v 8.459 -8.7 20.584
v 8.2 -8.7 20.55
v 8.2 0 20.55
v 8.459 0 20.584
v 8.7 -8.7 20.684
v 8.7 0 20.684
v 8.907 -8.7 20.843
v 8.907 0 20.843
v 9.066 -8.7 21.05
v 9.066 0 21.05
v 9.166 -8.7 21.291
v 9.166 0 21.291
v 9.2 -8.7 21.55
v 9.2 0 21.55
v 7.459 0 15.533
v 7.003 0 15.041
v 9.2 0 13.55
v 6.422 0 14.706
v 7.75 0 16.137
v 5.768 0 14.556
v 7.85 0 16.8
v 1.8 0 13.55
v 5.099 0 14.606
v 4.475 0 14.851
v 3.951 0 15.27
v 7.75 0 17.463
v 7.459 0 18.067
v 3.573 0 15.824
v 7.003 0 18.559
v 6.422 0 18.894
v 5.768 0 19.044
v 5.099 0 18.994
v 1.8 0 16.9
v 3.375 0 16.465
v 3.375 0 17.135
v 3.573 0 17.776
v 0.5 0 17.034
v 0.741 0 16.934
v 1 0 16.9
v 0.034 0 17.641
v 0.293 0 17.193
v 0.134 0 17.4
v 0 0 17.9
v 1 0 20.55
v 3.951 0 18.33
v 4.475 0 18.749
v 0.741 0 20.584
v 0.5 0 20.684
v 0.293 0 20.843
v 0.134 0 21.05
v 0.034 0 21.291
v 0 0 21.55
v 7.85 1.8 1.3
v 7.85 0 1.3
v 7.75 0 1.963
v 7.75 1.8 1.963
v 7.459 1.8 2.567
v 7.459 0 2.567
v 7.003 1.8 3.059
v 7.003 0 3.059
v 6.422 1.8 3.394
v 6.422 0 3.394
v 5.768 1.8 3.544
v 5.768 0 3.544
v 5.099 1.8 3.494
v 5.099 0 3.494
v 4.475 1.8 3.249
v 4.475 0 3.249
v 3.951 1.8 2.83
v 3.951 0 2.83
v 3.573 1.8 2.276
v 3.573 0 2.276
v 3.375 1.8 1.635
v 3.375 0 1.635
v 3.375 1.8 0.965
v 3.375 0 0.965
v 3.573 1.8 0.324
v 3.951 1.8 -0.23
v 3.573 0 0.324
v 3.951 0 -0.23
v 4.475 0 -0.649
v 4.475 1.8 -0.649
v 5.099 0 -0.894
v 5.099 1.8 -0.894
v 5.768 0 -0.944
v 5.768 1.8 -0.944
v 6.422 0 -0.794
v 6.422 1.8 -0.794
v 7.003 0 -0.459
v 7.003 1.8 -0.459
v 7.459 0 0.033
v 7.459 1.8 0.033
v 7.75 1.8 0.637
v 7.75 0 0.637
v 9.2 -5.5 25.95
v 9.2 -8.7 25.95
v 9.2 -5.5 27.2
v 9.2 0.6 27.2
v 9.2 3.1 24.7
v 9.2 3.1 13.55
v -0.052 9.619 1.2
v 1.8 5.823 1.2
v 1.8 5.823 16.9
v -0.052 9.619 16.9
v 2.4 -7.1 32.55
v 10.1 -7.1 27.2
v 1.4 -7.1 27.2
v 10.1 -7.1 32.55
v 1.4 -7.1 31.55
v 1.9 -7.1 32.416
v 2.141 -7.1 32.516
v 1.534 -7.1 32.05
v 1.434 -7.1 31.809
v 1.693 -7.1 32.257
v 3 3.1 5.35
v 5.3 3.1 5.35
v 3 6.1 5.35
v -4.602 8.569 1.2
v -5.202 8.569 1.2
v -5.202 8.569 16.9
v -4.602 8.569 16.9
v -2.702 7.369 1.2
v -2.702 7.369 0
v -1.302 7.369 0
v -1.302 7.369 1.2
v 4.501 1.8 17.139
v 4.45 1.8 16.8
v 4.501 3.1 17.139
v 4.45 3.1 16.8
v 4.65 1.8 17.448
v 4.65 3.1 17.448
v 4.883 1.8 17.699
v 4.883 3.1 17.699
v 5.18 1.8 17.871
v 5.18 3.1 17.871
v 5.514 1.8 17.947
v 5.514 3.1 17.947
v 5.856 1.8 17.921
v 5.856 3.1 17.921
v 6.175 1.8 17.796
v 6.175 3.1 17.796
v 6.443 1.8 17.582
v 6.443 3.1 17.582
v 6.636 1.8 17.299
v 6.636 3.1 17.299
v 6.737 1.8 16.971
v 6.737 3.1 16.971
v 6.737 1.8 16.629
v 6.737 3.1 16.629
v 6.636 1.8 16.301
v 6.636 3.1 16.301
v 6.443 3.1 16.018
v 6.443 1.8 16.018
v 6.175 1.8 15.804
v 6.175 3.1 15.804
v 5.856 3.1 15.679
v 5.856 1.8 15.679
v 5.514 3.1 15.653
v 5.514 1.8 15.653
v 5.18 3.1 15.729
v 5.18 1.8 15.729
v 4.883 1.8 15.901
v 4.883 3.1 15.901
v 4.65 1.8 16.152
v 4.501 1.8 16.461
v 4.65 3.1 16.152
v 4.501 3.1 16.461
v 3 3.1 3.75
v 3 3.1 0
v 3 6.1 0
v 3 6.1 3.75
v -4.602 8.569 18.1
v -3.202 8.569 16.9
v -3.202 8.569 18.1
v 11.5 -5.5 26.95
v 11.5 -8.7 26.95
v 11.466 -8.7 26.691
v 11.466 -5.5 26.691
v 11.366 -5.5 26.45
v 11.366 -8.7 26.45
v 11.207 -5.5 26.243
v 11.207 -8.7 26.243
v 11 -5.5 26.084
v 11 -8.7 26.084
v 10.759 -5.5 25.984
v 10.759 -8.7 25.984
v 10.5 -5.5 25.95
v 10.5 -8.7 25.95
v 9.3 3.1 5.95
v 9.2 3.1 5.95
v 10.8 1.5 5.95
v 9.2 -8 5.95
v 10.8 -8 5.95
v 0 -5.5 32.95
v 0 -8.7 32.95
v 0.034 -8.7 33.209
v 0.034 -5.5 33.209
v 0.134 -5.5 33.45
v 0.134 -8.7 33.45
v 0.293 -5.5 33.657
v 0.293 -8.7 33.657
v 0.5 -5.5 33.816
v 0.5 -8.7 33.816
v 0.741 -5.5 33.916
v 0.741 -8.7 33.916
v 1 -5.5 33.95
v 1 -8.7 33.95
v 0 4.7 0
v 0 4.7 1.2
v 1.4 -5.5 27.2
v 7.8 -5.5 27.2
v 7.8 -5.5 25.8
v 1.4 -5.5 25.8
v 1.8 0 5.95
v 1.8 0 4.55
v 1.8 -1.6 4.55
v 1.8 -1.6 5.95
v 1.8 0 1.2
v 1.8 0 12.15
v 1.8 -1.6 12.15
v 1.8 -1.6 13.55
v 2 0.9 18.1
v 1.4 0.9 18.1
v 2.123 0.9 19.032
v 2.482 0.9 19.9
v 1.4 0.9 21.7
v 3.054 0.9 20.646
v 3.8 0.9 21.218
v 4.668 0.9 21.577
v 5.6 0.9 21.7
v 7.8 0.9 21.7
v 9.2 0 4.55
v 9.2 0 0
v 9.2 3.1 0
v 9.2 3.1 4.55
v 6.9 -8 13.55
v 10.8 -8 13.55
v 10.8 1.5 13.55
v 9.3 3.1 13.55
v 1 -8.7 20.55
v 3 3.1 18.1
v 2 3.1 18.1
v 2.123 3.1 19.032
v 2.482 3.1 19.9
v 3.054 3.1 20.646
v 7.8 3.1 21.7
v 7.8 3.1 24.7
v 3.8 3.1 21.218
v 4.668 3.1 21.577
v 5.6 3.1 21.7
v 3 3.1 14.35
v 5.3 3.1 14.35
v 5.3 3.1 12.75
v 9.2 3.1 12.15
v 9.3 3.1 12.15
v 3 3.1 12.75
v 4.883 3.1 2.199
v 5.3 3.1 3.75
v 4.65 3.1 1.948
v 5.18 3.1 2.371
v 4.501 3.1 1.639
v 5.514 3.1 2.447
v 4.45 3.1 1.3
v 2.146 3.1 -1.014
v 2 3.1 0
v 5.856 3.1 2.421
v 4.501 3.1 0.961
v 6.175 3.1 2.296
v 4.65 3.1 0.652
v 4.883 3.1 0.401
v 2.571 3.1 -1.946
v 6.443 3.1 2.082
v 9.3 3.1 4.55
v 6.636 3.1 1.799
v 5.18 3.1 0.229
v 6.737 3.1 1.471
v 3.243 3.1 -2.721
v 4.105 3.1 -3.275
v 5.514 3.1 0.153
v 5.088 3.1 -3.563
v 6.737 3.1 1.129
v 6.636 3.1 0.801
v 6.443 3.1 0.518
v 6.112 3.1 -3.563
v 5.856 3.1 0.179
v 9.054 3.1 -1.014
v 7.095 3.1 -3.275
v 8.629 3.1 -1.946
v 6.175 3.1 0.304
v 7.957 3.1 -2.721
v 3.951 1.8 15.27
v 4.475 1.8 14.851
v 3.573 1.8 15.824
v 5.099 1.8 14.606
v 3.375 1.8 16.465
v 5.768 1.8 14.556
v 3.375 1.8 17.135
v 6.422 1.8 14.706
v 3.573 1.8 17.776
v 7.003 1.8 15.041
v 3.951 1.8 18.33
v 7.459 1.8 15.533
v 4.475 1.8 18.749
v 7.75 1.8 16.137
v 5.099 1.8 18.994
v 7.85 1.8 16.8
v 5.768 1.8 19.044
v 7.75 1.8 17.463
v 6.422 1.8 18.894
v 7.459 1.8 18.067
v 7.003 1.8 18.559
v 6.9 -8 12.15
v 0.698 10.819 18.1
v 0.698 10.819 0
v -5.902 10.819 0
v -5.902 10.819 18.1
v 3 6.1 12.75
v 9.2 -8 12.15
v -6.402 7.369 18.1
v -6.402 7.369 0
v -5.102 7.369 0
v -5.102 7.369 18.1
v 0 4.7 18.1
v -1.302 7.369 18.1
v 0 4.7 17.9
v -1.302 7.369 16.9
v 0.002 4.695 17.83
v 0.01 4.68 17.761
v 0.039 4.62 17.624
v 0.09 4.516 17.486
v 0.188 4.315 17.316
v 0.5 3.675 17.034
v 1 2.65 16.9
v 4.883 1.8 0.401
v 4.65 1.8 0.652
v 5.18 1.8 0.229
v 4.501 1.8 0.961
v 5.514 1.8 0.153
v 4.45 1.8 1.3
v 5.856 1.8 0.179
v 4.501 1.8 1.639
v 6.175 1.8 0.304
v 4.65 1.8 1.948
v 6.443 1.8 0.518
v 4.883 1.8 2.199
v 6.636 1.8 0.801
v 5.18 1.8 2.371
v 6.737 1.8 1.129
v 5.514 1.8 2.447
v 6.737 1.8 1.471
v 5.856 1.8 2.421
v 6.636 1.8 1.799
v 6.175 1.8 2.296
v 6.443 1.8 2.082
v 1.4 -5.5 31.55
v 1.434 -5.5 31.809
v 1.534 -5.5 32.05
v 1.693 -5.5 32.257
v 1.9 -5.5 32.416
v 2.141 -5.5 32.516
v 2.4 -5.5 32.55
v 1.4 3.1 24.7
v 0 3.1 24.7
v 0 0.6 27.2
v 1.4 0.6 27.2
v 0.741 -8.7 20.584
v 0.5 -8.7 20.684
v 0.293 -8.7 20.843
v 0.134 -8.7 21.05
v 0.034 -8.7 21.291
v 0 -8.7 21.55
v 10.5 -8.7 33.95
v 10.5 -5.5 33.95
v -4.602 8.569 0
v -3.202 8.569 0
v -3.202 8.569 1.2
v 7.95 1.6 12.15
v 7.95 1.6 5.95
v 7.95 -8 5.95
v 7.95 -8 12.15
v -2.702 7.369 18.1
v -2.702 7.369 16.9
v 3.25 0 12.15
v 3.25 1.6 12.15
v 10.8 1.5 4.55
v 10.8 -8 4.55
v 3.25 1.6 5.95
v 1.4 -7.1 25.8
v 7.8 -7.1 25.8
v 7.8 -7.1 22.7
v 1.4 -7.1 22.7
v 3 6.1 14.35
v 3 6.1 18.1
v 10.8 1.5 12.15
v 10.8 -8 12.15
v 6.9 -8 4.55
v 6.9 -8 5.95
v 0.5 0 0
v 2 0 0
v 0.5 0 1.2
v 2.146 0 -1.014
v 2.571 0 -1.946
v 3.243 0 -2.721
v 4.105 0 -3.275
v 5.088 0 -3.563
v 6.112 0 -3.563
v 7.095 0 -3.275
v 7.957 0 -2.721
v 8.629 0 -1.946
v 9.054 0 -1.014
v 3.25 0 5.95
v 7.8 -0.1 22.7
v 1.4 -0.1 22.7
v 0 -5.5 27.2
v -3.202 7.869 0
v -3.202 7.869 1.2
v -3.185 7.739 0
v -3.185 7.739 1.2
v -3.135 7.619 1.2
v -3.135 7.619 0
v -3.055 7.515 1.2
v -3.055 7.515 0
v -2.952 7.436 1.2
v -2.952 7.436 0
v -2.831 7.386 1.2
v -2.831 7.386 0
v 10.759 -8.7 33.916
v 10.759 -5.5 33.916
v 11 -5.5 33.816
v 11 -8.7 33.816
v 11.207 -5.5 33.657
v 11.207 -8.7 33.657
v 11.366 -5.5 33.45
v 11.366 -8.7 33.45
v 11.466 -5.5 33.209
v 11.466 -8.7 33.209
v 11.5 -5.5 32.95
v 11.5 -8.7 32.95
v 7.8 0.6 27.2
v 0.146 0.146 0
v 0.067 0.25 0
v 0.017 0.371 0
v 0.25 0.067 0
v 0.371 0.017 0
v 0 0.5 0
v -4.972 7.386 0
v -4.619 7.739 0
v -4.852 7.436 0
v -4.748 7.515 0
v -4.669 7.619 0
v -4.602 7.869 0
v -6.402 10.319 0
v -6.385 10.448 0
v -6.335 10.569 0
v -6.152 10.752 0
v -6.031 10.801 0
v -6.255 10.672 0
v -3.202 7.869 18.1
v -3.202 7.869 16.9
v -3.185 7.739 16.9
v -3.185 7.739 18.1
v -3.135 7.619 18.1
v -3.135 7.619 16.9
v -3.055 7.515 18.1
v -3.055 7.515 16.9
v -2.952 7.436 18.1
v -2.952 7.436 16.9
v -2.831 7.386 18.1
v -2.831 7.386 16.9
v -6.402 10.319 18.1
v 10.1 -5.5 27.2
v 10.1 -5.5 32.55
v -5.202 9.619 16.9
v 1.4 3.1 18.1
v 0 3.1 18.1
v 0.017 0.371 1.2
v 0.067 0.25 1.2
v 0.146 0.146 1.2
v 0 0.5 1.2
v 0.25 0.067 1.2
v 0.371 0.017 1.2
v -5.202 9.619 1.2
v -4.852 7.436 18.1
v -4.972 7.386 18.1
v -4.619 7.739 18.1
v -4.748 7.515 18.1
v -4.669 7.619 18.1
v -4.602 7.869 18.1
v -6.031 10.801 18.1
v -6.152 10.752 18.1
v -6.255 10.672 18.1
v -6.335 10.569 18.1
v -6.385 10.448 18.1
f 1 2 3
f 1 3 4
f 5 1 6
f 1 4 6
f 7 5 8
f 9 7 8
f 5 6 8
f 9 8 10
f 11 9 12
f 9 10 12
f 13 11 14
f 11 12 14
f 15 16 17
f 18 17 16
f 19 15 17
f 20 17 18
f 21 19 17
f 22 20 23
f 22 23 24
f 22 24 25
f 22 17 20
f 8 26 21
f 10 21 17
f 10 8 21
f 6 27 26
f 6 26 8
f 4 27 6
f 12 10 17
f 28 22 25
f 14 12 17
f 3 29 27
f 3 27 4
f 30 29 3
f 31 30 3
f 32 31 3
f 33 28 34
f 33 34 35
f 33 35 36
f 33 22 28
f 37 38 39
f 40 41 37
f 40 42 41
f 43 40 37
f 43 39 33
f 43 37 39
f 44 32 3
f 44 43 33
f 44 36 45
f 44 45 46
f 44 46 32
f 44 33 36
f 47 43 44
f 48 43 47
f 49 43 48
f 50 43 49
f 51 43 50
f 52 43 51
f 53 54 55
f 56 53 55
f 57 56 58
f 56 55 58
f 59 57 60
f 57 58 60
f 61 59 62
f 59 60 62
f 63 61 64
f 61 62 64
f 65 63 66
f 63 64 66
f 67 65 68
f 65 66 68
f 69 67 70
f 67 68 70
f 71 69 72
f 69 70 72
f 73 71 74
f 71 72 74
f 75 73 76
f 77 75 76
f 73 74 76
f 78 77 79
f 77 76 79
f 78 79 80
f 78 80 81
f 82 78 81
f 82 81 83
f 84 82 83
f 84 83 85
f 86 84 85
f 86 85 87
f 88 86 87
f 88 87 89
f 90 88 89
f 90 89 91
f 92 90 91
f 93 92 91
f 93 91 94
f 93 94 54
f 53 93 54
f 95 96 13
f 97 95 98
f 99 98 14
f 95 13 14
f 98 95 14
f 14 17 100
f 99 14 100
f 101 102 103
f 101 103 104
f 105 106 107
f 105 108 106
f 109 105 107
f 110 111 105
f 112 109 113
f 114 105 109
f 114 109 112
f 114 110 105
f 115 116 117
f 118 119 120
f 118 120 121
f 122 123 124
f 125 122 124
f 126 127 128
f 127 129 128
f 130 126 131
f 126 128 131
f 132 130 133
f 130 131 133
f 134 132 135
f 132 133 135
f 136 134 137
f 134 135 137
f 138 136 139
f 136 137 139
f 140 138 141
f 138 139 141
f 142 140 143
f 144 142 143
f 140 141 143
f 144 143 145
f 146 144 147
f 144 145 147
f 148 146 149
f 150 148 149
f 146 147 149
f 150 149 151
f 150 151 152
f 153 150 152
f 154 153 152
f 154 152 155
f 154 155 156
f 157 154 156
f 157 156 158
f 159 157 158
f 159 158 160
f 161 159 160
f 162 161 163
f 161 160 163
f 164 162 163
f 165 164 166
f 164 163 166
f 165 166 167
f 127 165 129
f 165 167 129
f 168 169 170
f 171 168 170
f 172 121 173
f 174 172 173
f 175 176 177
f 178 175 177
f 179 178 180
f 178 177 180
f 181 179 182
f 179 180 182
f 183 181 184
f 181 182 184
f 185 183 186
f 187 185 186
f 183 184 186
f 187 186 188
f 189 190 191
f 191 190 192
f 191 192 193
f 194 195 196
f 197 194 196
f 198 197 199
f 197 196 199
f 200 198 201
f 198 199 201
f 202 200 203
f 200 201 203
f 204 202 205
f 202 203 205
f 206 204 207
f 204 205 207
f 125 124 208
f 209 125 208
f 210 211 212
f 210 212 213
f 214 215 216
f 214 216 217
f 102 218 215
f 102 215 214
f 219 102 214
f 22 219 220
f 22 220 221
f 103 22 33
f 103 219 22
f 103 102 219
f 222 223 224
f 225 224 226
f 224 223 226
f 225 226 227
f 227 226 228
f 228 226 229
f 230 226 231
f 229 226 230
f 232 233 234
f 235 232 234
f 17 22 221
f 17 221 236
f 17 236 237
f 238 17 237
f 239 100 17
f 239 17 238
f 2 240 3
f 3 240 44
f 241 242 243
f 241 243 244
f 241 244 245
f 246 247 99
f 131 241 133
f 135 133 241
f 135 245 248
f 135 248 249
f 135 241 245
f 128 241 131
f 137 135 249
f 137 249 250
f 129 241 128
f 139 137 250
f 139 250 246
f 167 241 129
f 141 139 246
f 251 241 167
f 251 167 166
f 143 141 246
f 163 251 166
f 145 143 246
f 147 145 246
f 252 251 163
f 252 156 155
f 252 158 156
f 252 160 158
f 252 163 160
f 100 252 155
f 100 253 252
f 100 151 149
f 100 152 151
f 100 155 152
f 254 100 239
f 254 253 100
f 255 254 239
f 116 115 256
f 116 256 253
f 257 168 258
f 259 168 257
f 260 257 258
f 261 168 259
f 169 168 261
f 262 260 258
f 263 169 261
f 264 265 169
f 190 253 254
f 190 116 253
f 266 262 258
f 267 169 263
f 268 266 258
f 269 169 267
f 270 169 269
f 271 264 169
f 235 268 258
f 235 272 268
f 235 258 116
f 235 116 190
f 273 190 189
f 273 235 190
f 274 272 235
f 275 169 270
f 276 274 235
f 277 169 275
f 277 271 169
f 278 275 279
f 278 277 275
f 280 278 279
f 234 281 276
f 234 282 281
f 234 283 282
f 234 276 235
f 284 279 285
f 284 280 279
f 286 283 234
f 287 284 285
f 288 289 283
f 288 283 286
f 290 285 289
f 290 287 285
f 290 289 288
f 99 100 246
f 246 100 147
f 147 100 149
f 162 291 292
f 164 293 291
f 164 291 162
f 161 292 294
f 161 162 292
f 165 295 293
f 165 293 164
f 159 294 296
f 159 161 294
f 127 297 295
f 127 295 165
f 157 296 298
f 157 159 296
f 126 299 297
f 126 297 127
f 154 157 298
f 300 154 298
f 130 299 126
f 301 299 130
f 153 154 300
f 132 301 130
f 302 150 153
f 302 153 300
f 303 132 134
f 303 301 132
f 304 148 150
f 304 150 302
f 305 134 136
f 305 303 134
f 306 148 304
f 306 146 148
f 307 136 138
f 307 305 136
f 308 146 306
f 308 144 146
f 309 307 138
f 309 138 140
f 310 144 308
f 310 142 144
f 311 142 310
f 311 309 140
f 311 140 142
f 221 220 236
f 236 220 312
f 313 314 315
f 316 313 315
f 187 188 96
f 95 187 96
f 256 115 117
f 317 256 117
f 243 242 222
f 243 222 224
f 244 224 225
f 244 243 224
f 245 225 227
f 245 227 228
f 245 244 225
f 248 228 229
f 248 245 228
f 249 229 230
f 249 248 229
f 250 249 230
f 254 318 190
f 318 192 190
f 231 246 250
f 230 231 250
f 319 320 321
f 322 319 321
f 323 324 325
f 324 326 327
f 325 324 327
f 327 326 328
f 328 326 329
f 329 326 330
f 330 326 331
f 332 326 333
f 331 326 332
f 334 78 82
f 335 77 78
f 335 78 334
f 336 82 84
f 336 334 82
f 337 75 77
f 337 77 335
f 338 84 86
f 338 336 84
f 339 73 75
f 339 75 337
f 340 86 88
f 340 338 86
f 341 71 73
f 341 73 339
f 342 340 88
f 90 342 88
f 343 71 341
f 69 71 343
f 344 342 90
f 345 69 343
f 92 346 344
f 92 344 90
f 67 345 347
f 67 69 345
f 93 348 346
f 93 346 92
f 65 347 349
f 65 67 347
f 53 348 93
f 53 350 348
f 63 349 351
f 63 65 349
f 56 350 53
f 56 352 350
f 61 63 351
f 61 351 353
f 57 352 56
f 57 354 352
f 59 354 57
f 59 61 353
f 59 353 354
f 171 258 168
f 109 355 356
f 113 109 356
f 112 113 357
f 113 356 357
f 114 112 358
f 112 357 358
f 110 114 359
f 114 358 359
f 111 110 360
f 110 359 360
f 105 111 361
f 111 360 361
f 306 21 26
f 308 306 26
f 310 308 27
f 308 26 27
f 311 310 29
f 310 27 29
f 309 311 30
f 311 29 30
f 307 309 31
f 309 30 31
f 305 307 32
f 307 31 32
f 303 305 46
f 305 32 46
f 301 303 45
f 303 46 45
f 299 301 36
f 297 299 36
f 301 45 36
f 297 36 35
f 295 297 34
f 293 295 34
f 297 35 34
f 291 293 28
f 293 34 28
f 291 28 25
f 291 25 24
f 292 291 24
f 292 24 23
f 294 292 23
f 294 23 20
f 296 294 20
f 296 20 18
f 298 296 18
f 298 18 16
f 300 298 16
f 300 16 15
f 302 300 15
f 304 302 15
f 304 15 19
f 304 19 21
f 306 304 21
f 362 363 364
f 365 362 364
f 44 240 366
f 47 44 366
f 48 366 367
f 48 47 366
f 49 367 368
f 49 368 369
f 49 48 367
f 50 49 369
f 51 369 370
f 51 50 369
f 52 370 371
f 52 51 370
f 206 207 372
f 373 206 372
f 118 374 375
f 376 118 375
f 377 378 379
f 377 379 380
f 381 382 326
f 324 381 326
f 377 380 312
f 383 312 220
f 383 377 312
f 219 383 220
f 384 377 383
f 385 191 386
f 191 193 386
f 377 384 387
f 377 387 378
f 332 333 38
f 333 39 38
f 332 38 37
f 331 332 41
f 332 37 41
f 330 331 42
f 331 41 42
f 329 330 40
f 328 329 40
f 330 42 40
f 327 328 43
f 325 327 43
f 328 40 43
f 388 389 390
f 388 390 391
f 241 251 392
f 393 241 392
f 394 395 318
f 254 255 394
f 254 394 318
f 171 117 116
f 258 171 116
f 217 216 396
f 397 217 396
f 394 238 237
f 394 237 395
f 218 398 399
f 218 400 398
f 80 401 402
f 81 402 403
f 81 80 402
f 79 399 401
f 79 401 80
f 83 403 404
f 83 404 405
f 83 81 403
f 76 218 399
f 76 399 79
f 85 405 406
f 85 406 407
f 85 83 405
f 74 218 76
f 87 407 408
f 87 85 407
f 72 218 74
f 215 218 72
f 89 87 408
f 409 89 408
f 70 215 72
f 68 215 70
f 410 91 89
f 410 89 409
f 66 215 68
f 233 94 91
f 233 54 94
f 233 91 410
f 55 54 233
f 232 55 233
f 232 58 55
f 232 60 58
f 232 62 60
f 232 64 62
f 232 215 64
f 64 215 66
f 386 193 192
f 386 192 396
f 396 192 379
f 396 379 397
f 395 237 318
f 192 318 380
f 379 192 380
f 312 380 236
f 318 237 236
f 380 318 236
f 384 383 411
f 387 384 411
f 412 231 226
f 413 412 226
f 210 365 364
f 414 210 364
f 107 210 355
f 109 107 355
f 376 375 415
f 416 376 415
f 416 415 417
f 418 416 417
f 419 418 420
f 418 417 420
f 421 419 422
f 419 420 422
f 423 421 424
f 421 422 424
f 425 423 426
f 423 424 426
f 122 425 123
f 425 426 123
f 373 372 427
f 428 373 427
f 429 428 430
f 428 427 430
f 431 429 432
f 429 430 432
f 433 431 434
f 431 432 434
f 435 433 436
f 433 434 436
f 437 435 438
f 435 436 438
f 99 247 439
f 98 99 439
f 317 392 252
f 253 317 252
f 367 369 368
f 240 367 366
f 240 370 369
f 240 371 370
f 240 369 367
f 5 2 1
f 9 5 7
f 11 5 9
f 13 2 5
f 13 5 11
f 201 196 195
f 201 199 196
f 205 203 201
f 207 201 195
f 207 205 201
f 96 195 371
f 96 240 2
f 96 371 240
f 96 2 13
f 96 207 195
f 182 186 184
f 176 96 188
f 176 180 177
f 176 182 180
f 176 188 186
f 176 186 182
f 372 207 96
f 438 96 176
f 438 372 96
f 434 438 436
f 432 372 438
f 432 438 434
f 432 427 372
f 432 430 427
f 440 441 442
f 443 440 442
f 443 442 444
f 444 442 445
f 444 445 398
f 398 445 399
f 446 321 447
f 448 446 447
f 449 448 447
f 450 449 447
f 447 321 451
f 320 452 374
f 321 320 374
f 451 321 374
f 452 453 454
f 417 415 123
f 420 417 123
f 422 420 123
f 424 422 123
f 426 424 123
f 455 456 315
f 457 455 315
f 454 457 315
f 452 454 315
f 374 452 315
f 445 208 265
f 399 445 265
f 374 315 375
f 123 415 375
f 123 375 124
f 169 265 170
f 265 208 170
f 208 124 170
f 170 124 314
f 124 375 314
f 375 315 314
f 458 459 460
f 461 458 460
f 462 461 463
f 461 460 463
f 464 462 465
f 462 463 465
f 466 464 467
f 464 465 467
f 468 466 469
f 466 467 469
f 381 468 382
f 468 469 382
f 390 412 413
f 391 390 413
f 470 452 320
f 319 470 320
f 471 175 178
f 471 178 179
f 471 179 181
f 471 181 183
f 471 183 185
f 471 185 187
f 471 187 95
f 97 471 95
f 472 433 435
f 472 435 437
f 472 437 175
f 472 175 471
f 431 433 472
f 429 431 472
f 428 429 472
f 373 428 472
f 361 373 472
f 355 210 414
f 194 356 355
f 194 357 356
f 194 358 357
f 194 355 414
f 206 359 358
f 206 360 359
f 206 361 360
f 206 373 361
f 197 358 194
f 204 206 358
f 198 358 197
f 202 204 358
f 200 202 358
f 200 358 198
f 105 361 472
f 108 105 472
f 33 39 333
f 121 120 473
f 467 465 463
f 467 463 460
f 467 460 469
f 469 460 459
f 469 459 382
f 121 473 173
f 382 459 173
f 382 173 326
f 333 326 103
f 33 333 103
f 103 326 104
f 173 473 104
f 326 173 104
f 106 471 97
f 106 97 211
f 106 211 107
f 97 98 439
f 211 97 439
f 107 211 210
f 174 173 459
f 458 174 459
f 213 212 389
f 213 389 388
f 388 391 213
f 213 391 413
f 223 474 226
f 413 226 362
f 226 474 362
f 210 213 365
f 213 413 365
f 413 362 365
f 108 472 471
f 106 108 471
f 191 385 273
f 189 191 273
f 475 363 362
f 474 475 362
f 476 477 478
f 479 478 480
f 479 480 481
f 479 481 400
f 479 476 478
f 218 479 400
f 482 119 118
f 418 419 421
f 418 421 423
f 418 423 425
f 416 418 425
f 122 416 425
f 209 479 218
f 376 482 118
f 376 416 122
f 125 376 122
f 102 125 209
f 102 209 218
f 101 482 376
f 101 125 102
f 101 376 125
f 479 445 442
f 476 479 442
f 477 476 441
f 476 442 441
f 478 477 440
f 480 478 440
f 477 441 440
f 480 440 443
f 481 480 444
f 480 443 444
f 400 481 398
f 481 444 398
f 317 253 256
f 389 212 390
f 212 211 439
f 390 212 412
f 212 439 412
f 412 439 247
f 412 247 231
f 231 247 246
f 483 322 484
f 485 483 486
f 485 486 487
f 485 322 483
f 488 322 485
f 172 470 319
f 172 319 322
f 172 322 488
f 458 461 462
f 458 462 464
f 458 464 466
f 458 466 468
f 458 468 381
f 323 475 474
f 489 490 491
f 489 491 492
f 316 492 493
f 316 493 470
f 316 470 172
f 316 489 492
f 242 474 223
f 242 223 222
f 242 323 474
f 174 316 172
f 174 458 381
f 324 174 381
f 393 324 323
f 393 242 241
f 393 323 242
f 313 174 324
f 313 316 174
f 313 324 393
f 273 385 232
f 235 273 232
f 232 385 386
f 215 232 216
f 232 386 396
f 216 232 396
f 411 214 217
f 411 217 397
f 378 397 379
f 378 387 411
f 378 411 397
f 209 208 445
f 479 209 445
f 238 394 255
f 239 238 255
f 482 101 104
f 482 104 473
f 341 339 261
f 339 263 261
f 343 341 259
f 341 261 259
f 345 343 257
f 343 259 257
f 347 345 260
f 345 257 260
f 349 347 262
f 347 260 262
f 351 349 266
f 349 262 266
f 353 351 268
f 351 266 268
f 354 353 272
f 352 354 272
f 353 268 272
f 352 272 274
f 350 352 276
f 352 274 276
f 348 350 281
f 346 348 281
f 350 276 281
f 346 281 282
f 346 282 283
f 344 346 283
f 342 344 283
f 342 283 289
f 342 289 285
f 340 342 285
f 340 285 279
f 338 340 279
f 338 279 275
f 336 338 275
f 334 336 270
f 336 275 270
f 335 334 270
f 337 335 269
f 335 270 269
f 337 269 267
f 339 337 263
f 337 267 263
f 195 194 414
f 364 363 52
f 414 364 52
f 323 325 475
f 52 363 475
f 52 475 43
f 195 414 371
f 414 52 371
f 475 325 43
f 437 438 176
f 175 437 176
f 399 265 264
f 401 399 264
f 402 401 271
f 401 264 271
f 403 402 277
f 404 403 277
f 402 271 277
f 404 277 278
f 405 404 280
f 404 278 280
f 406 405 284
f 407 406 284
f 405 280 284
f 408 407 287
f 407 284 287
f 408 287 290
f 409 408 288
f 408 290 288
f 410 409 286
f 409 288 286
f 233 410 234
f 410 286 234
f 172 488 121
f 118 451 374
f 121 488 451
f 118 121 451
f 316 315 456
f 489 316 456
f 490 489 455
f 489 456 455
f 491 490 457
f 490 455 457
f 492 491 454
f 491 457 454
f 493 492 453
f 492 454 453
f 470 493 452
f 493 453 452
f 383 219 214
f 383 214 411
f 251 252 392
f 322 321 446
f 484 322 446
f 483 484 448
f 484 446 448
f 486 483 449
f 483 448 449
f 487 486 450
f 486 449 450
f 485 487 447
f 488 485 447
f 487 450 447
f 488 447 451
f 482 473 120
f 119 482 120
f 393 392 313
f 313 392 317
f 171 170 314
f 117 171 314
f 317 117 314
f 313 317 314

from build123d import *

# Parameters (mm, degrees)
EXTRUSION1_DEPTH                                  = 18.1
COQUE1_START                                      = 1.2
COQUE1_DEPTH                                      = 15.7
EXTRUSION2_DEPTH                                  = 3.1
ESQUISSE3_W                                       = 6.2
ESQUISSE3_H                                       = 18.1
EXTRUSION3_DEPTH                                  = 1.9
CHAMBRAGE_POUR_VIS_T_TE_HEXAGONALE_M2_D           = 2.3
CHAMBRAGE_POUR_VIS_T_TE_HEXAGONALE_M2_CBORE_D     = 4.5
CHAMBRAGE_POUR_VIS_T_TE_HEXAGONALE_M2_CBORE_DEPTH = 1.8
ENL_V_MAT_EXTRU_1_DEPTH                           = 1.6
EXTRUSION4_DEPTH                                  = 1.6
R_P_TITION_LIN_AIRE1_COUNT                        = 2
R_P_TITION_LIN_AIRE1_PITCH                        = 9
EXTRUSION5_DEPTH                                  = 8
EXTRUSION5_DIRECTION_2_REACH                      = 27.934
ENL_V_MAT_EXTRU_2_DEPTH                           = 23.973967556
EXTRUSION6_DEPTH                                  = 11.8
EXTRUSION7_DEPTH                                  = 9.6
CHANFREIN1_SIZE                                   = 1
ESQUISSE12_W                                      = 3.65
ESQUISSE12_H                                      = 8.7
ENL_V_MAT_EXTRU_3_DEPTH                           = 32.201293006
EXTRUSION8_DEPTH                                  = 3.2
ESQUISSE14_W                                      = 6.4
ESQUISSE14_H                                      = 3.1
ENL_V_MAT_EXTRU_4_DEPTH                           = 1.6
CONG_1_R                                          = 1
CONG_2_R                                          = 1


# Read off the part's stored shape, not the designer's step: Coque1
with BuildPart() as part:
    # Esquisse1 → Extrusion1 (new body)
    with BuildSketch(Plane.XY):
        with BuildLine():
            Line((0.5, 0), (9.2, 0))
            Line((9.2, 0), (9.2, 3.1))
            Line((9.2, 3.1), (3, 3.1))
            Line((3, 3.1), (3, 6.1))
            Line((3, 6.1), (0.698275932, 10.81853434))
            Line((0.698275932, 10.81853434), (-5.901724068, 10.81853434))
            ThreePointArc((-5.901724068, 10.81853434), (-6.255277459, 10.67208773), (-6.401724068, 10.31853434))
            Line((-6.401724068, 10.31853434), (-6.401724068, 7.36853434))
            Line((-6.401724068, 7.36853434), (-5.101724068, 7.36853434))
            ThreePointArc((-5.101724068, 7.36853434), (-4.748170678, 7.514980949), (-4.601724068, 7.86853434))
            Line((-4.601724068, 7.86853434), (-4.601724068, 8.56853434))
            Line((-4.601724068, 8.56853434), (-3.201724068, 8.56853434))
            Line((-3.201724068, 8.56853434), (-3.201724068, 7.86853434))
            ThreePointArc((-3.201724068, 7.86853434), (-3.055277459, 7.514980949), (-2.701724068, 7.36853434))
            Line((-2.701724068, 7.36853434), (-1.301724068, 7.36853434))
            Line((-1.301724068, 7.36853434), (0, 4.7))
            Line((0, 4.7), (0, 0.5))
            ThreePointArc((0, 0.5), (0.146446609, 0.146446609), (0.5, 0))
        make_face()
    extrude(amount=EXTRUSION1_DEPTH)

    # Coque1 outline → Coque1 (cut)
    with BuildSketch(Plane.XY.offset(COQUE1_START)):
        with BuildLine():
            Line((-5.201724068, 8.56853434), (-3.201724068, 8.56853434))
            Line((-3.201724068, 8.56853434), (-3.201724068, 7.86853434))
            ThreePointArc((-3.201724068, 7.86853434), (-3.055277459, 7.514980949), (-2.701724068, 7.36853434))
            Line((-2.701724068, 7.36853434), (-1.301724068, 7.36853434))
            Line((-1.301724068, 7.36853434), (0, 4.7))
            Line((0, 4.7), (0, 0.5))
            ThreePointArc((0, 0.5), (0.146446609, 0.146446609), (0.5, 0))
            Line((0.5, 0), (8, 0))
            Line((8, 0), (8, 1.9))
            Line((8, 1.9), (1.8, 1.9))
            Line((1.8, 1.9), (1.8, 5.822921265))
            Line((1.8, 5.822921265), (-0.051518573, 9.61853434))
            Line((-0.051518573, 9.61853434), (-5.201724068, 9.61853434))
            Line((-5.201724068, 9.61853434), (-5.201724068, 8.56853434))
        make_face()
    extrude(amount=COQUE1_DEPTH, mode=Mode.SUBTRACT)

    # Esquisse2 → Extrusion2 (add)
    with BuildSketch(Plane(origin=(0, 3.1, 0), x_dir=(-1, 0, 0), z_dir=(0, 1, 0))):
        with BuildLine():
            Line((-9.2, 0), (-2, 0))
            ThreePointArc((-2, 0), (-5.6, -3.6), (-9.2, 0))
        make_face()
        with BuildLine():
            Line((-9.2, 18.1), (-2, 18.1))
            ThreePointArc((-2, 18.1), (-5.6, 21.7), (-9.2, 18.1))
        make_face()
    extrude(amount=-EXTRUSION2_DEPTH)

    # Esquisse3 → Extrusion3 (add)
    with BuildSketch(Plane.XZ):
        with Locations((4.9, 9.05)):
            Rectangle(ESQUISSE3_W, ESQUISSE3_H)
    extrude(amount=-EXTRUSION3_DEPTH)

    # Chambrage pour vis à tête hexagonale M2.51 (through all)
    with Locations(Plane.XZ):
        with Locations((5.6, 1.3), (5.6, 16.8)):
            CounterBoreHole(CHAMBRAGE_POUR_VIS_T_TE_HEXAGONALE_M2_D / 2, CHAMBRAGE_POUR_VIS_T_TE_HEXAGONALE_M2_CBORE_D / 2, CHAMBRAGE_POUR_VIS_T_TE_HEXAGONALE_M2_CBORE_DEPTH)

    # Esquisse6 → Enlèv. mat.-Extru.1 (cut)
    with BuildSketch(Plane.XZ):
        with BuildLine():
            Line((3.75, 4.9), (7.45, 4.9))
            ThreePointArc((7.45, 4.9), (7.803553391, 5.046446609), (7.95, 5.4))
            Line((7.95, 5.4), (7.95, 12.7))
            ThreePointArc((7.95, 12.7), (7.803553391, 13.053553391), (7.45, 13.2))
            Line((7.45, 13.2), (3.75, 13.2))
            ThreePointArc((3.75, 13.2), (3.396446609, 13.053553391), (3.25, 12.7))
            Line((3.25, 12.7), (3.25, 5.4))
            ThreePointArc((3.25, 5.4), (3.396446609, 5.046446609), (3.75, 4.9))
        make_face()
    extrude(amount=-ENL_V_MAT_EXTRU_1_DEPTH, mode=Mode.SUBTRACT)

    # Esquisse7 → Extrusion4 (add)
    with BuildSketch(Plane.XY.offset(14.35)):
        Polygon((3, 6.1), (5.3, 3.1), (3, 3.1), align=None)
    extrusion4 = extrude(amount=-EXTRUSION4_DEPTH)

    # Répétition linéaire1: Extrusion4 ×2
    with Locations(*[(0, 0, -i * R_P_TITION_LIN_AIRE1_PITCH) for i in range(1, R_P_TITION_LIN_AIRE1_COUNT)]):
        add(extrusion4)

    # Esquisse8 → Extrusion5 (add)
    with BuildSketch(Plane.XZ):
        Polygon((10.8, 4.55), (1.8, 4.55), (1.8, 5.95), (7.95, 5.95), (7.95, 12.15), (1.8, 12.15), (1.8, 13.55), (10.8, 13.55), (10.8, 12.15), (9.2, 12.15), (9.2, 5.95), (10.8, 5.95), align=None)
    extrude(amount=EXTRUSION5_DEPTH)

    # Extrusion5 direction 2: up to this face of the body (flat: up to its plane)
    extrusion5_direction_2_end = Plane(part.part.faces().sort_by_distance((6.086516905, 3.1, 9.05))[0])
    # Esquisse8 → Extrusion5 direction 2 (add, up to the picked face)
    with BuildSketch(Plane.XZ, mode=Mode.PRIVATE) as extrusion5_direction_2_sk1:
        Polygon((10.8, 4.55), (1.8, 4.55), (1.8, 5.95), (7.95, 5.95), (7.95, 12.15), (1.8, 12.15), (1.8, 13.55), (10.8, 13.55), (10.8, 12.15), (9.2, 12.15), (9.2, 5.95), (10.8, 5.95), align=None)
    extrusion5_direction_2_tool1 = split(extrude(extrusion5_direction_2_sk1.sketch, amount=-EXTRUSION5_DIRECTION_2_REACH, mode=Mode.PRIVATE), bisect_by=extrusion5_direction_2_end, keep=Keep.BOTH, mode=Mode.PRIVATE)
    add(extrusion5_direction_2_tool1.solids().sort_by(Axis((6.3, 0, 4.677279), (0, 1, 0)))[0])

    # Esquisse9 → Enlèv. mat.-Extru.2 (cut, through all)
    with BuildSketch(Plane(origin=(0, 0, 4.55), x_dir=(-1, 0, 0), z_dir=(0, 0, -1))):
        Polygon((-6.9, -8), (-1.8, -8), (-1.8, -1.6), align=None)
        Polygon((-10.8, 3.1), (-10.8, 1.5), (-9.3, 3.1), align=None)
    extrude(amount=-ENL_V_MAT_EXTRU_2_DEPTH, mode=Mode.SUBTRACT)

    # Esquisse10 → Extrusion6 (add)
    with BuildSketch(Plane(origin=(0, 3.1, 0), x_dir=(-1, 0, 0), z_dir=(0, 1, 0))):
        with BuildLine():
            Line((-9.2, 17.467725461), (-9.2, 27.2))
            Line((-9.2, 27.2), (-7.8, 27.2))
            Line((-7.8, 27.2), (-7.8, 21.7))
            Line((-7.8, 21.7), (-5.6, 21.7))
            ThreePointArc((-5.6, 21.7), (-3.054415588, 20.645584412), (-2, 18.1))
            Line((-2, 18.1), (-1.4, 18.1))
            Line((-1.4, 18.1), (-1.4, 27.2))
            Line((-1.4, 27.2), (0, 27.2))
            Line((0, 27.2), (0, 16.9))
            Line((0, 16.9), (-1.097371231, 16.9))
            Line((-1.097371231, 16.9), (-5.6, 19.545108536))
            Line((-5.6, 19.545108536), (-9.2, 17.467725461))
        make_face()
    extrude(amount=-EXTRUSION6_DEPTH)

    # Esquisse11 → Extrusion7 (add)
    with BuildSketch(Plane(origin=(0, 0.9, 0), x_dir=(-1, 0, 0), z_dir=(0, 1, 0))):
        with BuildLine():
            Line((-1.4, 22.7), (-1.4, 18.1))
            Line((-1.4, 18.1), (-2, 18.1))
            ThreePointArc((-2, 18.1), (-3.054415588, 20.645584412), (-5.6, 21.7))
            Line((-5.6, 21.7), (-7.8, 21.7))
            Line((-7.8, 21.7), (-7.8, 22.7))
            Line((-7.8, 22.7), (-1.4, 22.7))
        make_face()
    extrude(amount=-EXTRUSION7_DEPTH)

    # Chanfrein1
    chanfrein1_edges = [part.edges().sort_by_distance(p)[0] for p in [
        (4.6, 0.9, 22.7),
    ]]
    chamfer(chanfrein1_edges, length=CHANFREIN1_SIZE - 0.0001)  # a hair under: the kernel refuses the full size

    # Esquisse12 → Enlèv. mat.-Extru.3 (cut, through all)
    with BuildSketch(Plane.ZY):
        with Locations((18.725, -4.35)):
            Rectangle(ESQUISSE12_W, ESQUISSE12_H)
        Polygon((27.2, 3.1), (24.7, 3.1), (27.2, 0.6), align=None)
    extrude(amount=-ENL_V_MAT_EXTRU_3_DEPTH, mode=Mode.SUBTRACT)

    # Esquisse13 → Extrusion8 (add)
    with BuildSketch(Plane.XZ.offset(8.7)):
        with BuildLine():
            Line((9.2, 20.55), (0, 20.55))
            Line((0, 20.55), (0, 32.95))
            ThreePointArc((0, 32.95), (0.292893219, 33.657106781), (1, 33.95))
            Line((1, 33.95), (9.2, 33.95))
            Line((9.2, 33.95), (10.5, 33.95))
            ThreePointArc((10.5, 33.95), (11.207106781, 33.657106781), (11.5, 32.95))
            Line((11.5, 32.95), (11.5, 26.95))
            ThreePointArc((11.5, 26.95), (11.207106781, 26.242893219), (10.5, 25.95))
            Line((10.5, 25.95), (9.2, 25.95))
            Line((9.2, 25.95), (9.2, 20.55))
        make_face()
    extrude(amount=-EXTRUSION8_DEPTH)

    # Esquisse14 → Enlèv. mat.-Extru.4 (cut)
    with BuildSketch(Plane(origin=(0, -5.5, 0), x_dir=(-1, 0, 0), z_dir=(0, 1, 0))):
        with BuildLine():
            Line((-10.1, 27.2), (-1.4, 27.2))
            Line((-1.4, 27.2), (-1.4, 31.55))
            ThreePointArc((-1.4, 31.55), (-1.692893219, 32.257106781), (-2.4, 32.55))
            Line((-2.4, 32.55), (-10.1, 32.55))
            Line((-10.1, 32.55), (-10.1, 27.2))
        make_face()
        with Locations((-4.6, 24.25)):
            Rectangle(ESQUISSE14_W, ESQUISSE14_H)
    extrude(amount=-ENL_V_MAT_EXTRU_4_DEPTH, mode=Mode.SUBTRACT)

    # Congé1
    cong_1_edges = [part.edges().sort_by_distance(p)[0] for p in [
        (9.2, -4.35, 20.55),
        (0, -4.35, 20.55),
    ]]
    fillet(cong_1_edges, radius=CONG_1_R)

    # Congé2
    cong_2_edges = [part.edges().sort_by_distance(p)[0] for p in [
        (0, 2.35, 16.9),
    ]]
    fillet(cong_2_edges, radius=CONG_2_R)


solid = part.part
